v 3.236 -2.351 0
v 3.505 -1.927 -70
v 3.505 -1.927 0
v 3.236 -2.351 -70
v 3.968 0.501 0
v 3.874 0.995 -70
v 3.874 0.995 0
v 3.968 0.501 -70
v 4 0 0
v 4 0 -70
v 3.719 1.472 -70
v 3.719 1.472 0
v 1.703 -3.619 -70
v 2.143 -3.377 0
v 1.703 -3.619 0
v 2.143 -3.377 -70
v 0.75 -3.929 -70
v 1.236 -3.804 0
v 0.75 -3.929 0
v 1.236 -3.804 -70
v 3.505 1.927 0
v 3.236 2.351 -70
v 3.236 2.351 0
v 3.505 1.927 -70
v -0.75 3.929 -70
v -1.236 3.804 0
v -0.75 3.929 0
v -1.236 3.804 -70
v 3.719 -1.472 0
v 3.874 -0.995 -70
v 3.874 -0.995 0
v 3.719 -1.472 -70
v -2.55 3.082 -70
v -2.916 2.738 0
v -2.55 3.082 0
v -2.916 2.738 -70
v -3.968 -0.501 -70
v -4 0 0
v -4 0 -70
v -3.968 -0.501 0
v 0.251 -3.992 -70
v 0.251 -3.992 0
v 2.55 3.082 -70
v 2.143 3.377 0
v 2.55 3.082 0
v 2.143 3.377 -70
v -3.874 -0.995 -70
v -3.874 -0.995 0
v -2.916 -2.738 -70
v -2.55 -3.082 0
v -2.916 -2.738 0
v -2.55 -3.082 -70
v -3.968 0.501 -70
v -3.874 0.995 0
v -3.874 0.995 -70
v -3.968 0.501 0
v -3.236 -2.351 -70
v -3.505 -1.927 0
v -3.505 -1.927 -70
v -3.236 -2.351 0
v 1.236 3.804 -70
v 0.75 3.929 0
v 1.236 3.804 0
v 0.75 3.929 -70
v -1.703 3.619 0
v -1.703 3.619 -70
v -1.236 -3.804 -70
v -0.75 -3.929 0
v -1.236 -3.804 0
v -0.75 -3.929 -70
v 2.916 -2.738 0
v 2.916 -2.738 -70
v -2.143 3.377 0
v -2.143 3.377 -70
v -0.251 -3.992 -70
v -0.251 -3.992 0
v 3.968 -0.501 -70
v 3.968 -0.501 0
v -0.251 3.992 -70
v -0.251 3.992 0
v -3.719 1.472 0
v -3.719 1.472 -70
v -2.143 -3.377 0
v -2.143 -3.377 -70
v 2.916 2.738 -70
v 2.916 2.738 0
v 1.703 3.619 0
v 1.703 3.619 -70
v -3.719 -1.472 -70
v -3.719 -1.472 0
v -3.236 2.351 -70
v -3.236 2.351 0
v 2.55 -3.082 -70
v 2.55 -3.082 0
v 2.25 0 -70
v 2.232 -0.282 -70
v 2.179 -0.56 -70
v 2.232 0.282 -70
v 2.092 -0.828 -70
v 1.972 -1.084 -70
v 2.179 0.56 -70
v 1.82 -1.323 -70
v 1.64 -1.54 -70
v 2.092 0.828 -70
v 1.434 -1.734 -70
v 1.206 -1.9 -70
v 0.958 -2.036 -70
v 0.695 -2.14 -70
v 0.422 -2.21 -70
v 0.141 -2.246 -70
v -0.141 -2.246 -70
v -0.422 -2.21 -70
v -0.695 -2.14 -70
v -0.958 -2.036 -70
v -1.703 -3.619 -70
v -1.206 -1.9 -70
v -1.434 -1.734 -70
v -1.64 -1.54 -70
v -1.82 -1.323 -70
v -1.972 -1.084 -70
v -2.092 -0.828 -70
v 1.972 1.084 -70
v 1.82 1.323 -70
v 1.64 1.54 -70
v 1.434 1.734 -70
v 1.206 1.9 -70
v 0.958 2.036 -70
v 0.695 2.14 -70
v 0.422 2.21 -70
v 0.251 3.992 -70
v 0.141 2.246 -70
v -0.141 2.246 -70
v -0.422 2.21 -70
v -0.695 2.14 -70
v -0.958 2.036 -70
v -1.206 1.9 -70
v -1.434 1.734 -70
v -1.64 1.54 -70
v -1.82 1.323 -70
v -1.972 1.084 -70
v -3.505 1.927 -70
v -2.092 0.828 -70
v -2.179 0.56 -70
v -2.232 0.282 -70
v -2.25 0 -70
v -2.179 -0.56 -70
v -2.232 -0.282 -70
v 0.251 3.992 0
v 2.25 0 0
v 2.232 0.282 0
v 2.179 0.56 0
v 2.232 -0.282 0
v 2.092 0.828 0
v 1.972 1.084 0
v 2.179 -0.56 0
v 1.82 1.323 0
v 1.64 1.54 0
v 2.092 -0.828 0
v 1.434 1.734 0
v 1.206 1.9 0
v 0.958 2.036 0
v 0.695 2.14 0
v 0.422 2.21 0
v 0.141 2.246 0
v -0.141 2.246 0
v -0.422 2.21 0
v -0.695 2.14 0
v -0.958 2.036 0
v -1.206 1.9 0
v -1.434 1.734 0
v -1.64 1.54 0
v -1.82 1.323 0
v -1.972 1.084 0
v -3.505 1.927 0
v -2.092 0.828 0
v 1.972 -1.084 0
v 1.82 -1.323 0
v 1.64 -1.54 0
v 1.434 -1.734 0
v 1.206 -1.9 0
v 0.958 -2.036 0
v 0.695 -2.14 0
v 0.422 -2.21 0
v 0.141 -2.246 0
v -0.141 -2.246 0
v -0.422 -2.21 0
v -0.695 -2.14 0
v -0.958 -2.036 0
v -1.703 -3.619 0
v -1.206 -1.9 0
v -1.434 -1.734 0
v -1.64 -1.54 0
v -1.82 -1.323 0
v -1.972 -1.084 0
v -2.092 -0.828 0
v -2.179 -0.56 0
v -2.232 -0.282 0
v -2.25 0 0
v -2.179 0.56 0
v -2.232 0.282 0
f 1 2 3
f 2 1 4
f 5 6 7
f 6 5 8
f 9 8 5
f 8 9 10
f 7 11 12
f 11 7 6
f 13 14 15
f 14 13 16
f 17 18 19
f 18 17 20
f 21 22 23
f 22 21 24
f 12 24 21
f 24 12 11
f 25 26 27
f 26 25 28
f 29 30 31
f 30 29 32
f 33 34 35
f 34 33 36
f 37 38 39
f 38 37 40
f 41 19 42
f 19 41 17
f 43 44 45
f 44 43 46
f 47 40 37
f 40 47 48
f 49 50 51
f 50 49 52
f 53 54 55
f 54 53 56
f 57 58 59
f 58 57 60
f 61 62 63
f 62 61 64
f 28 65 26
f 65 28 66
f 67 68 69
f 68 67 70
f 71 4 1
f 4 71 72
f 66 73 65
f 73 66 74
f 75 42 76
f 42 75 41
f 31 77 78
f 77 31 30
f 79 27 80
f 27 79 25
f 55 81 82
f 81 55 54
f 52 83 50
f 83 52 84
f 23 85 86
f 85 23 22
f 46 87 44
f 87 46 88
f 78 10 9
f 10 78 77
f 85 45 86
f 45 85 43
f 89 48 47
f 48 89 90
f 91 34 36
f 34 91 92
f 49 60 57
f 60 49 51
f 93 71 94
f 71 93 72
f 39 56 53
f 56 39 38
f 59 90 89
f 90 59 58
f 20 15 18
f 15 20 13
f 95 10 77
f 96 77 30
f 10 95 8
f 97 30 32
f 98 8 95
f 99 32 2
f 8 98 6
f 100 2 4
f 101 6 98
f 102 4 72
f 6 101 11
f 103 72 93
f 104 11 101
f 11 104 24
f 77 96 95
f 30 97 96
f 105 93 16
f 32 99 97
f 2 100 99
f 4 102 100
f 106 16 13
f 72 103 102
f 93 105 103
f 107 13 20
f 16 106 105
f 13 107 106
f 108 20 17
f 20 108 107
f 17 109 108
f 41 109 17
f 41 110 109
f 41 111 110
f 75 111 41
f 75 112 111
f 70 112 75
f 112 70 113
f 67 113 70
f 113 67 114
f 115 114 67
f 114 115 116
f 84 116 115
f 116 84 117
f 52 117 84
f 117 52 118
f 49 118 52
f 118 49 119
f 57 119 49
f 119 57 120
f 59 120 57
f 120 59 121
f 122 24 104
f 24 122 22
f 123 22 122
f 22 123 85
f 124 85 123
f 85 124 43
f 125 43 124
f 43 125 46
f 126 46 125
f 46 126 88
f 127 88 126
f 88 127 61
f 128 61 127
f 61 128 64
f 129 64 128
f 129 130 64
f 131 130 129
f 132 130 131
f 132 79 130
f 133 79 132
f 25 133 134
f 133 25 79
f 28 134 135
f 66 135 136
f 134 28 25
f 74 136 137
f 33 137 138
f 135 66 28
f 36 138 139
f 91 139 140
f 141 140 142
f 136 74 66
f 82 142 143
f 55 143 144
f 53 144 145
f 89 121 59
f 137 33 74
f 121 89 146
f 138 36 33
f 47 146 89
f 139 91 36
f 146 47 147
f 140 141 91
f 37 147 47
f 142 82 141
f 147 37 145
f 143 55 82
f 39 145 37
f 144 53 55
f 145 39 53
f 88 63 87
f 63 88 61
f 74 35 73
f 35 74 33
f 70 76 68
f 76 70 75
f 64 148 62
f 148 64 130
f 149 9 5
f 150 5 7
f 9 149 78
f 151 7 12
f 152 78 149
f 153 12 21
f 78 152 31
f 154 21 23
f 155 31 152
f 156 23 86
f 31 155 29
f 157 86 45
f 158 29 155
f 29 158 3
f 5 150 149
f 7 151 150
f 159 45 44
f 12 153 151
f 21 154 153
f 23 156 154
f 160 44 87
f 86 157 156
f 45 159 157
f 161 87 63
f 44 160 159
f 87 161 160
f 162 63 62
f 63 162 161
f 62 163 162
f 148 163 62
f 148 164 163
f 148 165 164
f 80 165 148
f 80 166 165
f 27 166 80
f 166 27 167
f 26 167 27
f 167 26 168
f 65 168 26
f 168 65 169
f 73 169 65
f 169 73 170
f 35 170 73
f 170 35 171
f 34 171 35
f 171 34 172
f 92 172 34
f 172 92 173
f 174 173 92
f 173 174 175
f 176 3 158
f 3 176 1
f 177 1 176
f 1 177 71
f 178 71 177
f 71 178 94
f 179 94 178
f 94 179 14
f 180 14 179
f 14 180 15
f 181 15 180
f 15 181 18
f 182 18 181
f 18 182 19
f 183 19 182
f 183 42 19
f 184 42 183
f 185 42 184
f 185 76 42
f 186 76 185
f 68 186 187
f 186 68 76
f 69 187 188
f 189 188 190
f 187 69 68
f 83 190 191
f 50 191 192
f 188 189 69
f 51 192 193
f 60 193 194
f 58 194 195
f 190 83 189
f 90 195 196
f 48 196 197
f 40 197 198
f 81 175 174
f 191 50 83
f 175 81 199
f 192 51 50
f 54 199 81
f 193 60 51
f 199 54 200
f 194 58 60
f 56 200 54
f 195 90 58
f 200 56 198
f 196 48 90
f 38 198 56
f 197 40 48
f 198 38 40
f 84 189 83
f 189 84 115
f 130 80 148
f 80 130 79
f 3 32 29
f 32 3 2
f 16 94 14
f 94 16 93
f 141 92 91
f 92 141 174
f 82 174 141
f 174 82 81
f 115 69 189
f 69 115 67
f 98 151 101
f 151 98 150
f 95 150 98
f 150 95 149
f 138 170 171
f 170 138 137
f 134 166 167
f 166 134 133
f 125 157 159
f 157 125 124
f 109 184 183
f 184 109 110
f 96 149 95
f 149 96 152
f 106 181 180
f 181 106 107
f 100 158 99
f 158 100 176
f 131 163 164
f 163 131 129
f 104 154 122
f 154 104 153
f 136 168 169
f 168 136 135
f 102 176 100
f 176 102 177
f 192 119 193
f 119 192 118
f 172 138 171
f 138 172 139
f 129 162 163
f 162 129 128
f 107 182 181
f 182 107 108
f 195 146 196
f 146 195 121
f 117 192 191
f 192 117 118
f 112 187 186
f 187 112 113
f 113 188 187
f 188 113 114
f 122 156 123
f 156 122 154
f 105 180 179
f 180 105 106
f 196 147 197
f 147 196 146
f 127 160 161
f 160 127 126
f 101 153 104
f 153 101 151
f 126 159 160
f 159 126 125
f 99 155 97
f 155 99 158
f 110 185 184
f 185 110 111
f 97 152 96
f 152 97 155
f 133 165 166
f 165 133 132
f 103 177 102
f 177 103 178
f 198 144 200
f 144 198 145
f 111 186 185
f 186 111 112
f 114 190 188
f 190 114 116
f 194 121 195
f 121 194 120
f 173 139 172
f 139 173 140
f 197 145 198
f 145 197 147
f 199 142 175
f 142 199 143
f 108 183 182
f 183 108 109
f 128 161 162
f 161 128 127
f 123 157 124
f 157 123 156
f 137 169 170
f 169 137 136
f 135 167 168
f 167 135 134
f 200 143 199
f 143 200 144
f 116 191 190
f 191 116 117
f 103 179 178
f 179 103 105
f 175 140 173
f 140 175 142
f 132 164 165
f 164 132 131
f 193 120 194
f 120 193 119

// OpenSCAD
$fn = 50;


difference() {
	union() {
		translate(v = [0, 0, -70.0000000000]) {
			cylinder(h = 70, r = 4.0000000000);
		}
		cylinder(h = 0, r = 7.0000000000);
	}
	union() {
		#translate(v = [0, 0, -70]) {
			cylinder(h = 70, r = 2.2500000000);
		}
	}
}
